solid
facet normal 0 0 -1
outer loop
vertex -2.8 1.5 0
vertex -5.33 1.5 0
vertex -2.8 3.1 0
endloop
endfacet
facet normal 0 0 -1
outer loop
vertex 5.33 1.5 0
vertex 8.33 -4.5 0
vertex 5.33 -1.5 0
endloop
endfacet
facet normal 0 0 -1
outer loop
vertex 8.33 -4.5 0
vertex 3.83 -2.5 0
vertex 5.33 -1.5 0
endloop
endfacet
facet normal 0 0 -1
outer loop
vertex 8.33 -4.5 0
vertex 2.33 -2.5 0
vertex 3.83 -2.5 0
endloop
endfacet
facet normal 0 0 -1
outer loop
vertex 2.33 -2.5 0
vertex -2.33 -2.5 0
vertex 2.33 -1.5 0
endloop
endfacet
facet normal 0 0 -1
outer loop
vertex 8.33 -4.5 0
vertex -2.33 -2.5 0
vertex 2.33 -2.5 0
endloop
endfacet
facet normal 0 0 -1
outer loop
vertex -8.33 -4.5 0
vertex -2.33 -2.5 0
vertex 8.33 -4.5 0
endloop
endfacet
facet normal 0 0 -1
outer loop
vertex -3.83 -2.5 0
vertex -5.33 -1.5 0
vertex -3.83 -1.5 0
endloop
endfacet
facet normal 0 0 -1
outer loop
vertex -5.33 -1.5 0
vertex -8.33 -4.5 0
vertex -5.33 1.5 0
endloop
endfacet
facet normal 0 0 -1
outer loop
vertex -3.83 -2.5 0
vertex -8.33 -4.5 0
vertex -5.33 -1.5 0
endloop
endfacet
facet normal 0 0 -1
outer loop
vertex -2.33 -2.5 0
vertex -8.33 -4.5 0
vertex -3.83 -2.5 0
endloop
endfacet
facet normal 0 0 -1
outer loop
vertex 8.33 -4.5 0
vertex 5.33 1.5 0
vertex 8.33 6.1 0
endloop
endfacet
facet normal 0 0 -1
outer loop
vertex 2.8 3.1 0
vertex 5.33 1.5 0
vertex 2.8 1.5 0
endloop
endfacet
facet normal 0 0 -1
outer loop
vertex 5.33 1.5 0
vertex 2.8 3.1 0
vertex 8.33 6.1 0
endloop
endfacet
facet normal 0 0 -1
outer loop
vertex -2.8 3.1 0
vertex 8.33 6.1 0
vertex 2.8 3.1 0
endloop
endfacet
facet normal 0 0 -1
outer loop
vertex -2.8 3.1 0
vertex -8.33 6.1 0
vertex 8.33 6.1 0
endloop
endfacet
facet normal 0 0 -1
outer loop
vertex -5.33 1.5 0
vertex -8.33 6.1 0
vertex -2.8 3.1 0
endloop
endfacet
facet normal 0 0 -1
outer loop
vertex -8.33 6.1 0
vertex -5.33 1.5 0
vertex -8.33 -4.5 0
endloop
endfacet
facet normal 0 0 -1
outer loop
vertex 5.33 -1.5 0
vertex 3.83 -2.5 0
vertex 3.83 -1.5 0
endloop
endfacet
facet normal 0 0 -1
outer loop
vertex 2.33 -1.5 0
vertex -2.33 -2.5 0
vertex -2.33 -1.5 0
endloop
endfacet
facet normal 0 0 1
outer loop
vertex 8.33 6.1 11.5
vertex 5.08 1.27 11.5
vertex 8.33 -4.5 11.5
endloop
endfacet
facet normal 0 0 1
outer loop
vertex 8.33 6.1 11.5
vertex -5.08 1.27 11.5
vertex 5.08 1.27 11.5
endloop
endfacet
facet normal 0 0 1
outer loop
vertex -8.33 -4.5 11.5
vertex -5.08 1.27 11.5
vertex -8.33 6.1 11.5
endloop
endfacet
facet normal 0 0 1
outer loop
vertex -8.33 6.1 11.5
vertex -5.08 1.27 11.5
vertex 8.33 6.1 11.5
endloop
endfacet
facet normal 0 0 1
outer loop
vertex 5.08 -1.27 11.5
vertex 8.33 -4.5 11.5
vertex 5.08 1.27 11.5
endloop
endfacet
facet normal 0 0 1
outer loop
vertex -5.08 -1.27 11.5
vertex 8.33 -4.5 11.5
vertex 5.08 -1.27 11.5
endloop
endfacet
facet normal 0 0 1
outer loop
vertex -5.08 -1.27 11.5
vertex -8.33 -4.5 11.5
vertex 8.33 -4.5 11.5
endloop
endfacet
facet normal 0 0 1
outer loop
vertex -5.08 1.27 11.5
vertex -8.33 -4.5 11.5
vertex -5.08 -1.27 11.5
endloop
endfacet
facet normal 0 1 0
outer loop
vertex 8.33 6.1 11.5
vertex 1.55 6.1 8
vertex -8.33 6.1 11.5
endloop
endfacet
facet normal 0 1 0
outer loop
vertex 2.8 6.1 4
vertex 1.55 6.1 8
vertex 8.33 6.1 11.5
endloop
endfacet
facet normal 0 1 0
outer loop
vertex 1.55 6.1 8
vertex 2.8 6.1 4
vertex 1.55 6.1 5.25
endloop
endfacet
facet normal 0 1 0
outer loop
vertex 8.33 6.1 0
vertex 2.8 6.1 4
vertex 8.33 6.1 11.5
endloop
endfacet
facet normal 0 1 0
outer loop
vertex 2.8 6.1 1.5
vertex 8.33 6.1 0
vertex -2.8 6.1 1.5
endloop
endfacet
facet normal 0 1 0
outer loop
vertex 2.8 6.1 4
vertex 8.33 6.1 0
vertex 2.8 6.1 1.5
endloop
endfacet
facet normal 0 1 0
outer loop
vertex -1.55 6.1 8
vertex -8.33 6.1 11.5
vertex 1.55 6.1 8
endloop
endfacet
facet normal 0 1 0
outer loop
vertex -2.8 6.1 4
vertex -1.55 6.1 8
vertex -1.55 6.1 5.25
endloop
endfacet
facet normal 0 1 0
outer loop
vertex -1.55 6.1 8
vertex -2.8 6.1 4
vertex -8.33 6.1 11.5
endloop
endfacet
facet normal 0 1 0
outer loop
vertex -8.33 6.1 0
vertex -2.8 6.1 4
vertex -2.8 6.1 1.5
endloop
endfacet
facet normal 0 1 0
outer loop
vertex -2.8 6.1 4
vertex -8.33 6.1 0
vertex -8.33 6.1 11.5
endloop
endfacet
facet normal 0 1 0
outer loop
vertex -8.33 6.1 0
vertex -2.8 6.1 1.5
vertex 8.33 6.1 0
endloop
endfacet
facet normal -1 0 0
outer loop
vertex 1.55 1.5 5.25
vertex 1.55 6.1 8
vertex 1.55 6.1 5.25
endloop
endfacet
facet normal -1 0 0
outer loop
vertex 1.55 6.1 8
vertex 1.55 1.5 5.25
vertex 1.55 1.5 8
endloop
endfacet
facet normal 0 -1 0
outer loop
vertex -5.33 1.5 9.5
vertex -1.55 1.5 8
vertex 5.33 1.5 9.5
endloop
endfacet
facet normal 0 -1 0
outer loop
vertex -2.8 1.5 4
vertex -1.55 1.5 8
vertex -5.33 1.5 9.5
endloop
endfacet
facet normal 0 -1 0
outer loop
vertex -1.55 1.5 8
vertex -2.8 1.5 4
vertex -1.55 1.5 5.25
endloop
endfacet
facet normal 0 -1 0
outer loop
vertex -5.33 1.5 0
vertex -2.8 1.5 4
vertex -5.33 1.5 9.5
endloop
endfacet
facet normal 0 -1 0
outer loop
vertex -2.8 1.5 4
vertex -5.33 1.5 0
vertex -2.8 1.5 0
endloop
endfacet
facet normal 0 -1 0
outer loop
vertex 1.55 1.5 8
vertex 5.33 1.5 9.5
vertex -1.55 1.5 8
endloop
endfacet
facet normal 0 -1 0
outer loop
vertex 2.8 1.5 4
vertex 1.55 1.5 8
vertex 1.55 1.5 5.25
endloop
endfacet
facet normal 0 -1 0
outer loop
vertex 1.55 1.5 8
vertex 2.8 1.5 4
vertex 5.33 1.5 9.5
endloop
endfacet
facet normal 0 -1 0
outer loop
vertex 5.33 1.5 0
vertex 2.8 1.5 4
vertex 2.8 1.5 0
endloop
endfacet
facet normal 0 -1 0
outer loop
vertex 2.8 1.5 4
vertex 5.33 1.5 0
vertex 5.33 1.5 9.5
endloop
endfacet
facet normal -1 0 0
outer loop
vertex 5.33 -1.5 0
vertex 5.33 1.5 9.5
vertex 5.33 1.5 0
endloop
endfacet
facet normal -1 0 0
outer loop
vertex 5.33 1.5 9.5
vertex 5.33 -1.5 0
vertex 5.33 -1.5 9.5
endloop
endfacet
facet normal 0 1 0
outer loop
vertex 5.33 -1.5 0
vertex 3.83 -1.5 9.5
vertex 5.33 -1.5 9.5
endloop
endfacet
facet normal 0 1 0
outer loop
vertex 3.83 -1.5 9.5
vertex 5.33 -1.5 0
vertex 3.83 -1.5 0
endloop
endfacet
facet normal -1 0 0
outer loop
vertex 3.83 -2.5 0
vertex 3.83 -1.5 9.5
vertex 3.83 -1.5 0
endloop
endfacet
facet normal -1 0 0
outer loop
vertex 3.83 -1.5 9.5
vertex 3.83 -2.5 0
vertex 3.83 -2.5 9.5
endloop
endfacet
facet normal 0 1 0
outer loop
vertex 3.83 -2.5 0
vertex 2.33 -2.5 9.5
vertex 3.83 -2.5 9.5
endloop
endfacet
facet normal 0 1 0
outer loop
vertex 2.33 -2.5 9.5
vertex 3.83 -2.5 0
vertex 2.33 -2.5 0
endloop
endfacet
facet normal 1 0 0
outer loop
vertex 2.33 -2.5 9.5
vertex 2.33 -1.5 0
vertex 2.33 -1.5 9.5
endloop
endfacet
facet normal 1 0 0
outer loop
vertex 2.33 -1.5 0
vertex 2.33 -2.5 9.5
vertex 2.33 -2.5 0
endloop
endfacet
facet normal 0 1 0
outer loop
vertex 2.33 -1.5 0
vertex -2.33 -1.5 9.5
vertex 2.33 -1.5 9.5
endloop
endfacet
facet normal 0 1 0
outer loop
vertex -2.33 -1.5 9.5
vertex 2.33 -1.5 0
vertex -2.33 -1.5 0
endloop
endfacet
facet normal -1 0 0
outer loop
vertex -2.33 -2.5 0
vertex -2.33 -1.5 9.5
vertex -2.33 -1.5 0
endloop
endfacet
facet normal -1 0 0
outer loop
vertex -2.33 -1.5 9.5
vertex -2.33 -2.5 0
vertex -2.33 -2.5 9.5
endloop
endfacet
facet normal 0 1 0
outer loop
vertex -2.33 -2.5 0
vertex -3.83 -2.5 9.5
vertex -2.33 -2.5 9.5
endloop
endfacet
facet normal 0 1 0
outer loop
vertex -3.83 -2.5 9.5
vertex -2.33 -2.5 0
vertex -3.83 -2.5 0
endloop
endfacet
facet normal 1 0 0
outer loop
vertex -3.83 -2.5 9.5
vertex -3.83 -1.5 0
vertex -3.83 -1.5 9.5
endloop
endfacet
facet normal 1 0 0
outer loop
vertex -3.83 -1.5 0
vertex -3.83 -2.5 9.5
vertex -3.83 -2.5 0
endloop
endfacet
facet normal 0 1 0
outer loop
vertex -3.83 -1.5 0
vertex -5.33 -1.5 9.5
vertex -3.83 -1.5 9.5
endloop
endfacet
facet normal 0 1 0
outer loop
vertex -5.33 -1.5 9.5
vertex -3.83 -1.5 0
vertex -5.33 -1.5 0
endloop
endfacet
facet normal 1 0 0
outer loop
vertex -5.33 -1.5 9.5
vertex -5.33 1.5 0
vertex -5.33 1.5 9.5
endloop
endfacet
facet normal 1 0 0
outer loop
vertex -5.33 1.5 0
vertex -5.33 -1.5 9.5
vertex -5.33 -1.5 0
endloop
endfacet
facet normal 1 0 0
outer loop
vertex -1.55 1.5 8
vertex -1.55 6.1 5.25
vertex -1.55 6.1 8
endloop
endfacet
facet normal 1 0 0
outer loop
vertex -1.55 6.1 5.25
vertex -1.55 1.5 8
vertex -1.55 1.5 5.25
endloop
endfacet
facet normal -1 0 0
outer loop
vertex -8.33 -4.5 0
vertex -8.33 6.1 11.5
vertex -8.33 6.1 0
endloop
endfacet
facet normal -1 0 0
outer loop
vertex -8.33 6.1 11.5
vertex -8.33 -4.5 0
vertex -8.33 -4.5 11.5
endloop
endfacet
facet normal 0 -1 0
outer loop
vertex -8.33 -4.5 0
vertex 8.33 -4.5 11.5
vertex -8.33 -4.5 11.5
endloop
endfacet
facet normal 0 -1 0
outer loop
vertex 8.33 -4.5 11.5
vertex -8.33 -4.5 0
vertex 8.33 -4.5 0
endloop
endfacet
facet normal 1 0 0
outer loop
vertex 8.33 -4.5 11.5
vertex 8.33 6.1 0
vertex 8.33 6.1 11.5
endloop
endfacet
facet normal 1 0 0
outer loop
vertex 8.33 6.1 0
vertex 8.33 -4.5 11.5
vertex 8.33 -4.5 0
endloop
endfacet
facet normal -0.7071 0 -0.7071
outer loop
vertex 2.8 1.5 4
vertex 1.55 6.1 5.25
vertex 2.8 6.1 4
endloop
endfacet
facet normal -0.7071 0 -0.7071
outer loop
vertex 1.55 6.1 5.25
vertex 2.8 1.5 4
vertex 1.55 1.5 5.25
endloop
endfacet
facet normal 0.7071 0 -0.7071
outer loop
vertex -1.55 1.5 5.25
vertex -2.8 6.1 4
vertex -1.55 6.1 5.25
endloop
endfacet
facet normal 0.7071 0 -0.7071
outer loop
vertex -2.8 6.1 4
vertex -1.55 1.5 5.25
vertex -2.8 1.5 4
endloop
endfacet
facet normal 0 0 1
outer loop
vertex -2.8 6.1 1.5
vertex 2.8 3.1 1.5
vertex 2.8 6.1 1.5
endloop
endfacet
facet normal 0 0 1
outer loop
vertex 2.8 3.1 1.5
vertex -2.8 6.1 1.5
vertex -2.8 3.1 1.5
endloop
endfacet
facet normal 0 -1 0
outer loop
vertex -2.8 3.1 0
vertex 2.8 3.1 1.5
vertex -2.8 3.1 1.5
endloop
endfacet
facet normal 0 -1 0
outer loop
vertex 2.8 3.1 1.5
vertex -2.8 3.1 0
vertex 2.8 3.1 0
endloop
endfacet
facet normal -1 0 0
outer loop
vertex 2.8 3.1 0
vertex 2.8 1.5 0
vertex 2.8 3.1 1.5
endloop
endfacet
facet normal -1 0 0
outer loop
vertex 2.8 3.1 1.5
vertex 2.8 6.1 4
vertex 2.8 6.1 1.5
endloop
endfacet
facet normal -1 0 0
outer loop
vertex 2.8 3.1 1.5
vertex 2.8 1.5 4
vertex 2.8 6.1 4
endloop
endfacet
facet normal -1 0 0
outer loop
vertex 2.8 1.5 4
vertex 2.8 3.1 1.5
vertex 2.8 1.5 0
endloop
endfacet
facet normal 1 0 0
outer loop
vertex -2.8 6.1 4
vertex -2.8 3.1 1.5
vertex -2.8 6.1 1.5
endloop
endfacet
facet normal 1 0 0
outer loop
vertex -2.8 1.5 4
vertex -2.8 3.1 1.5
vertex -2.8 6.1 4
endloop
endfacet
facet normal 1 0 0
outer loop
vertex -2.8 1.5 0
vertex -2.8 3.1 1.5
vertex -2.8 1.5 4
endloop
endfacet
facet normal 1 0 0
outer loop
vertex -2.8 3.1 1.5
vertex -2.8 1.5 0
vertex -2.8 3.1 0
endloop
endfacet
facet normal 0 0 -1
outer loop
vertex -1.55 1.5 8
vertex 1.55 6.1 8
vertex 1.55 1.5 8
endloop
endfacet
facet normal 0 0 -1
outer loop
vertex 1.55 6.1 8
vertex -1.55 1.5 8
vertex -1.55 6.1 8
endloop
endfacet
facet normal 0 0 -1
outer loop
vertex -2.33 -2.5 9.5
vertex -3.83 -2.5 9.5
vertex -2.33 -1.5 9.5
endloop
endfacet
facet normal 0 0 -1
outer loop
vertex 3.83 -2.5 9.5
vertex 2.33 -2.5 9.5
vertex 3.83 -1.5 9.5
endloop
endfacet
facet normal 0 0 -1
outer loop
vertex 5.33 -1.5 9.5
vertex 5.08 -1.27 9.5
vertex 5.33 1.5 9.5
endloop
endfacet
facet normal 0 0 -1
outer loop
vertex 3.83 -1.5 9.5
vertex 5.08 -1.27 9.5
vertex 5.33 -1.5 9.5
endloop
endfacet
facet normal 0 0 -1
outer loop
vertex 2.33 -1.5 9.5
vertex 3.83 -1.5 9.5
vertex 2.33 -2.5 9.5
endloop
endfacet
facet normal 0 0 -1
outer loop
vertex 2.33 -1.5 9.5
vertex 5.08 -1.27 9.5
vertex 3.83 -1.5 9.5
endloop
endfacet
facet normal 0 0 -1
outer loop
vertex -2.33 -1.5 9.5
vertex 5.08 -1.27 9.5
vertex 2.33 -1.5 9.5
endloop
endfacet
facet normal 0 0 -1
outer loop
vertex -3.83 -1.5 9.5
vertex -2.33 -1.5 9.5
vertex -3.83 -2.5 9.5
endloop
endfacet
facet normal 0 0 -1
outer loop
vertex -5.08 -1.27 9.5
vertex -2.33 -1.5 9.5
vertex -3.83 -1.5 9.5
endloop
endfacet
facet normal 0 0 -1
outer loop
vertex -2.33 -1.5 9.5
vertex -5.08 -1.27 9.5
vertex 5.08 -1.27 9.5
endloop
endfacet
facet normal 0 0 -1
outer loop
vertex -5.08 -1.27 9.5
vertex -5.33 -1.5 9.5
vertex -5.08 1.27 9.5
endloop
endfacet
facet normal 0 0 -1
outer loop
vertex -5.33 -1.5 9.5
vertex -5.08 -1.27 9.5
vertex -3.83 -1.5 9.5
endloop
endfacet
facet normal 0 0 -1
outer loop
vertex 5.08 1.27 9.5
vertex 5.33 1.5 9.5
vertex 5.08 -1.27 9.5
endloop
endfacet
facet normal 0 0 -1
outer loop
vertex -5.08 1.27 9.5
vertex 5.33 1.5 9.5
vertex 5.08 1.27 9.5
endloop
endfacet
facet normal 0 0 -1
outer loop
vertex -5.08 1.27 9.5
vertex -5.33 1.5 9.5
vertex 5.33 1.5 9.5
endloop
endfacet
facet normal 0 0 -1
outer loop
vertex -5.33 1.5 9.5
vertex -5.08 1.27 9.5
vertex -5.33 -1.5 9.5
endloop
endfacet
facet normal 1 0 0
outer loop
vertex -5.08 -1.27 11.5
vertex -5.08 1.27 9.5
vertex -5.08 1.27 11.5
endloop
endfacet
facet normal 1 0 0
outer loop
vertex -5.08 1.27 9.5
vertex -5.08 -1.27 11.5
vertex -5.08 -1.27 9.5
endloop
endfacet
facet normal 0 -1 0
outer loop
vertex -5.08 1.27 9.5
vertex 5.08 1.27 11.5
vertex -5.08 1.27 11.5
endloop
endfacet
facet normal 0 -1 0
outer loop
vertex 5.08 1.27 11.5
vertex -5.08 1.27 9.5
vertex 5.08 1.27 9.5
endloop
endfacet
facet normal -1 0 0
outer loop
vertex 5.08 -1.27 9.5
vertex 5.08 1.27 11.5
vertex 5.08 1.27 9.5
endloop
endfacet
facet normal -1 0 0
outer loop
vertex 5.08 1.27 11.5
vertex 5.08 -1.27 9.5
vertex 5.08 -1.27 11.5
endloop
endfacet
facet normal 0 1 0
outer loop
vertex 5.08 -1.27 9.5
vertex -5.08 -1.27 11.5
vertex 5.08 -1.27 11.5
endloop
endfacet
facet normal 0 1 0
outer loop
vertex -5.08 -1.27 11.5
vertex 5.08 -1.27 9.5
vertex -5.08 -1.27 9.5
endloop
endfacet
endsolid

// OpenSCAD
wallthick = 3;
pins = 4;

linear_extrude(height = 1.5, convexity = 2) difference() {
	translate([0, 0.8, 0]) square([wallthick * 2 + 2.54 * pins + 0.5, wallthick * 2 + 3 + 1.6], center = true);
	square([2.54 * pins + 0.5, 3], center = true);
	translate([0, 0.8, 0]) square([6.5, 3 + 1.6], center = true);
	for(side = [1, -1]) translate([side * (pins / 2 * 2.54 - 2), -1, 0]) square([1.5, 3], center = true);
}

difference() {
	linear_extrude(height = 11.5, convexity = 2) difference() {
		translate([0, 0.8, 0]) square([wallthick * 2 + 2.54 * pins + 0.5, wallthick * 2 + 3 + 1.6], center = true);
		square([2.54 * pins + 0.5, 3], center = true);
		translate([0, 1 + wallthick / 2, 0]) square([3.1, 3 + 1.6 + wallthick], center = true);
		for(side = [1, -1]) translate([side * (pins / 2 * 2.54 - 2), -1, 0]) square([1.5, 3], center = true);
	}
	rotate([0, 45, 0]) cube([(1.5 + 2.5 + 5.6 / 2) * sqrt(2), 10 + wallthick * 2, (1.5 + 2.5 + 5.6 / 2) * sqrt(2)], center = true);
}

linear_extrude(height = 11.5, convexity = 2) difference() {
	translate([0, 0.8, 0]) square([wallthick * 2 + 2.54 * pins + 0.5, wallthick * 2 + 3 + 1.6], center = true);
	square([2.54 * pins + 0.5, 3], center = true);
	translate([0, 1 + wallthick / 2, 0]) square([5.6, 3 + 1.6 + wallthick], center = true);
	for(side = [1, -1]) translate([side * (pins / 2 * 2.54 - 2), -1, 0]) square([1.5, 3], center = true);
}

translate([0, 0, 8]) linear_extrude(height = 3.5, convexity = 2) difference() {
	translate([0, 0.8, 0]) square([wallthick * 2 + 2.54 * pins + 0.5, wallthick * 2 + 3 + 1.6], center = true);
	square([2.54 * pins + 0.5, 3], center = true);
	for(side = [1, -1]) translate([side * (pins / 2 * 2.54 - 2), -1, 0]) square([1.5, 3], center = true);
}

translate([0, 0, 11.5 - 2]) linear_extrude(height = 2, convexity = 2) difference() {
	translate([0, 0.8, 0]) square([wallthick * 2 + 2.54 * pins + 0.5, wallthick * 2 + 3 + 1.6], center = true);
	square([2.54 * pins, 2.54], center = true);
}
